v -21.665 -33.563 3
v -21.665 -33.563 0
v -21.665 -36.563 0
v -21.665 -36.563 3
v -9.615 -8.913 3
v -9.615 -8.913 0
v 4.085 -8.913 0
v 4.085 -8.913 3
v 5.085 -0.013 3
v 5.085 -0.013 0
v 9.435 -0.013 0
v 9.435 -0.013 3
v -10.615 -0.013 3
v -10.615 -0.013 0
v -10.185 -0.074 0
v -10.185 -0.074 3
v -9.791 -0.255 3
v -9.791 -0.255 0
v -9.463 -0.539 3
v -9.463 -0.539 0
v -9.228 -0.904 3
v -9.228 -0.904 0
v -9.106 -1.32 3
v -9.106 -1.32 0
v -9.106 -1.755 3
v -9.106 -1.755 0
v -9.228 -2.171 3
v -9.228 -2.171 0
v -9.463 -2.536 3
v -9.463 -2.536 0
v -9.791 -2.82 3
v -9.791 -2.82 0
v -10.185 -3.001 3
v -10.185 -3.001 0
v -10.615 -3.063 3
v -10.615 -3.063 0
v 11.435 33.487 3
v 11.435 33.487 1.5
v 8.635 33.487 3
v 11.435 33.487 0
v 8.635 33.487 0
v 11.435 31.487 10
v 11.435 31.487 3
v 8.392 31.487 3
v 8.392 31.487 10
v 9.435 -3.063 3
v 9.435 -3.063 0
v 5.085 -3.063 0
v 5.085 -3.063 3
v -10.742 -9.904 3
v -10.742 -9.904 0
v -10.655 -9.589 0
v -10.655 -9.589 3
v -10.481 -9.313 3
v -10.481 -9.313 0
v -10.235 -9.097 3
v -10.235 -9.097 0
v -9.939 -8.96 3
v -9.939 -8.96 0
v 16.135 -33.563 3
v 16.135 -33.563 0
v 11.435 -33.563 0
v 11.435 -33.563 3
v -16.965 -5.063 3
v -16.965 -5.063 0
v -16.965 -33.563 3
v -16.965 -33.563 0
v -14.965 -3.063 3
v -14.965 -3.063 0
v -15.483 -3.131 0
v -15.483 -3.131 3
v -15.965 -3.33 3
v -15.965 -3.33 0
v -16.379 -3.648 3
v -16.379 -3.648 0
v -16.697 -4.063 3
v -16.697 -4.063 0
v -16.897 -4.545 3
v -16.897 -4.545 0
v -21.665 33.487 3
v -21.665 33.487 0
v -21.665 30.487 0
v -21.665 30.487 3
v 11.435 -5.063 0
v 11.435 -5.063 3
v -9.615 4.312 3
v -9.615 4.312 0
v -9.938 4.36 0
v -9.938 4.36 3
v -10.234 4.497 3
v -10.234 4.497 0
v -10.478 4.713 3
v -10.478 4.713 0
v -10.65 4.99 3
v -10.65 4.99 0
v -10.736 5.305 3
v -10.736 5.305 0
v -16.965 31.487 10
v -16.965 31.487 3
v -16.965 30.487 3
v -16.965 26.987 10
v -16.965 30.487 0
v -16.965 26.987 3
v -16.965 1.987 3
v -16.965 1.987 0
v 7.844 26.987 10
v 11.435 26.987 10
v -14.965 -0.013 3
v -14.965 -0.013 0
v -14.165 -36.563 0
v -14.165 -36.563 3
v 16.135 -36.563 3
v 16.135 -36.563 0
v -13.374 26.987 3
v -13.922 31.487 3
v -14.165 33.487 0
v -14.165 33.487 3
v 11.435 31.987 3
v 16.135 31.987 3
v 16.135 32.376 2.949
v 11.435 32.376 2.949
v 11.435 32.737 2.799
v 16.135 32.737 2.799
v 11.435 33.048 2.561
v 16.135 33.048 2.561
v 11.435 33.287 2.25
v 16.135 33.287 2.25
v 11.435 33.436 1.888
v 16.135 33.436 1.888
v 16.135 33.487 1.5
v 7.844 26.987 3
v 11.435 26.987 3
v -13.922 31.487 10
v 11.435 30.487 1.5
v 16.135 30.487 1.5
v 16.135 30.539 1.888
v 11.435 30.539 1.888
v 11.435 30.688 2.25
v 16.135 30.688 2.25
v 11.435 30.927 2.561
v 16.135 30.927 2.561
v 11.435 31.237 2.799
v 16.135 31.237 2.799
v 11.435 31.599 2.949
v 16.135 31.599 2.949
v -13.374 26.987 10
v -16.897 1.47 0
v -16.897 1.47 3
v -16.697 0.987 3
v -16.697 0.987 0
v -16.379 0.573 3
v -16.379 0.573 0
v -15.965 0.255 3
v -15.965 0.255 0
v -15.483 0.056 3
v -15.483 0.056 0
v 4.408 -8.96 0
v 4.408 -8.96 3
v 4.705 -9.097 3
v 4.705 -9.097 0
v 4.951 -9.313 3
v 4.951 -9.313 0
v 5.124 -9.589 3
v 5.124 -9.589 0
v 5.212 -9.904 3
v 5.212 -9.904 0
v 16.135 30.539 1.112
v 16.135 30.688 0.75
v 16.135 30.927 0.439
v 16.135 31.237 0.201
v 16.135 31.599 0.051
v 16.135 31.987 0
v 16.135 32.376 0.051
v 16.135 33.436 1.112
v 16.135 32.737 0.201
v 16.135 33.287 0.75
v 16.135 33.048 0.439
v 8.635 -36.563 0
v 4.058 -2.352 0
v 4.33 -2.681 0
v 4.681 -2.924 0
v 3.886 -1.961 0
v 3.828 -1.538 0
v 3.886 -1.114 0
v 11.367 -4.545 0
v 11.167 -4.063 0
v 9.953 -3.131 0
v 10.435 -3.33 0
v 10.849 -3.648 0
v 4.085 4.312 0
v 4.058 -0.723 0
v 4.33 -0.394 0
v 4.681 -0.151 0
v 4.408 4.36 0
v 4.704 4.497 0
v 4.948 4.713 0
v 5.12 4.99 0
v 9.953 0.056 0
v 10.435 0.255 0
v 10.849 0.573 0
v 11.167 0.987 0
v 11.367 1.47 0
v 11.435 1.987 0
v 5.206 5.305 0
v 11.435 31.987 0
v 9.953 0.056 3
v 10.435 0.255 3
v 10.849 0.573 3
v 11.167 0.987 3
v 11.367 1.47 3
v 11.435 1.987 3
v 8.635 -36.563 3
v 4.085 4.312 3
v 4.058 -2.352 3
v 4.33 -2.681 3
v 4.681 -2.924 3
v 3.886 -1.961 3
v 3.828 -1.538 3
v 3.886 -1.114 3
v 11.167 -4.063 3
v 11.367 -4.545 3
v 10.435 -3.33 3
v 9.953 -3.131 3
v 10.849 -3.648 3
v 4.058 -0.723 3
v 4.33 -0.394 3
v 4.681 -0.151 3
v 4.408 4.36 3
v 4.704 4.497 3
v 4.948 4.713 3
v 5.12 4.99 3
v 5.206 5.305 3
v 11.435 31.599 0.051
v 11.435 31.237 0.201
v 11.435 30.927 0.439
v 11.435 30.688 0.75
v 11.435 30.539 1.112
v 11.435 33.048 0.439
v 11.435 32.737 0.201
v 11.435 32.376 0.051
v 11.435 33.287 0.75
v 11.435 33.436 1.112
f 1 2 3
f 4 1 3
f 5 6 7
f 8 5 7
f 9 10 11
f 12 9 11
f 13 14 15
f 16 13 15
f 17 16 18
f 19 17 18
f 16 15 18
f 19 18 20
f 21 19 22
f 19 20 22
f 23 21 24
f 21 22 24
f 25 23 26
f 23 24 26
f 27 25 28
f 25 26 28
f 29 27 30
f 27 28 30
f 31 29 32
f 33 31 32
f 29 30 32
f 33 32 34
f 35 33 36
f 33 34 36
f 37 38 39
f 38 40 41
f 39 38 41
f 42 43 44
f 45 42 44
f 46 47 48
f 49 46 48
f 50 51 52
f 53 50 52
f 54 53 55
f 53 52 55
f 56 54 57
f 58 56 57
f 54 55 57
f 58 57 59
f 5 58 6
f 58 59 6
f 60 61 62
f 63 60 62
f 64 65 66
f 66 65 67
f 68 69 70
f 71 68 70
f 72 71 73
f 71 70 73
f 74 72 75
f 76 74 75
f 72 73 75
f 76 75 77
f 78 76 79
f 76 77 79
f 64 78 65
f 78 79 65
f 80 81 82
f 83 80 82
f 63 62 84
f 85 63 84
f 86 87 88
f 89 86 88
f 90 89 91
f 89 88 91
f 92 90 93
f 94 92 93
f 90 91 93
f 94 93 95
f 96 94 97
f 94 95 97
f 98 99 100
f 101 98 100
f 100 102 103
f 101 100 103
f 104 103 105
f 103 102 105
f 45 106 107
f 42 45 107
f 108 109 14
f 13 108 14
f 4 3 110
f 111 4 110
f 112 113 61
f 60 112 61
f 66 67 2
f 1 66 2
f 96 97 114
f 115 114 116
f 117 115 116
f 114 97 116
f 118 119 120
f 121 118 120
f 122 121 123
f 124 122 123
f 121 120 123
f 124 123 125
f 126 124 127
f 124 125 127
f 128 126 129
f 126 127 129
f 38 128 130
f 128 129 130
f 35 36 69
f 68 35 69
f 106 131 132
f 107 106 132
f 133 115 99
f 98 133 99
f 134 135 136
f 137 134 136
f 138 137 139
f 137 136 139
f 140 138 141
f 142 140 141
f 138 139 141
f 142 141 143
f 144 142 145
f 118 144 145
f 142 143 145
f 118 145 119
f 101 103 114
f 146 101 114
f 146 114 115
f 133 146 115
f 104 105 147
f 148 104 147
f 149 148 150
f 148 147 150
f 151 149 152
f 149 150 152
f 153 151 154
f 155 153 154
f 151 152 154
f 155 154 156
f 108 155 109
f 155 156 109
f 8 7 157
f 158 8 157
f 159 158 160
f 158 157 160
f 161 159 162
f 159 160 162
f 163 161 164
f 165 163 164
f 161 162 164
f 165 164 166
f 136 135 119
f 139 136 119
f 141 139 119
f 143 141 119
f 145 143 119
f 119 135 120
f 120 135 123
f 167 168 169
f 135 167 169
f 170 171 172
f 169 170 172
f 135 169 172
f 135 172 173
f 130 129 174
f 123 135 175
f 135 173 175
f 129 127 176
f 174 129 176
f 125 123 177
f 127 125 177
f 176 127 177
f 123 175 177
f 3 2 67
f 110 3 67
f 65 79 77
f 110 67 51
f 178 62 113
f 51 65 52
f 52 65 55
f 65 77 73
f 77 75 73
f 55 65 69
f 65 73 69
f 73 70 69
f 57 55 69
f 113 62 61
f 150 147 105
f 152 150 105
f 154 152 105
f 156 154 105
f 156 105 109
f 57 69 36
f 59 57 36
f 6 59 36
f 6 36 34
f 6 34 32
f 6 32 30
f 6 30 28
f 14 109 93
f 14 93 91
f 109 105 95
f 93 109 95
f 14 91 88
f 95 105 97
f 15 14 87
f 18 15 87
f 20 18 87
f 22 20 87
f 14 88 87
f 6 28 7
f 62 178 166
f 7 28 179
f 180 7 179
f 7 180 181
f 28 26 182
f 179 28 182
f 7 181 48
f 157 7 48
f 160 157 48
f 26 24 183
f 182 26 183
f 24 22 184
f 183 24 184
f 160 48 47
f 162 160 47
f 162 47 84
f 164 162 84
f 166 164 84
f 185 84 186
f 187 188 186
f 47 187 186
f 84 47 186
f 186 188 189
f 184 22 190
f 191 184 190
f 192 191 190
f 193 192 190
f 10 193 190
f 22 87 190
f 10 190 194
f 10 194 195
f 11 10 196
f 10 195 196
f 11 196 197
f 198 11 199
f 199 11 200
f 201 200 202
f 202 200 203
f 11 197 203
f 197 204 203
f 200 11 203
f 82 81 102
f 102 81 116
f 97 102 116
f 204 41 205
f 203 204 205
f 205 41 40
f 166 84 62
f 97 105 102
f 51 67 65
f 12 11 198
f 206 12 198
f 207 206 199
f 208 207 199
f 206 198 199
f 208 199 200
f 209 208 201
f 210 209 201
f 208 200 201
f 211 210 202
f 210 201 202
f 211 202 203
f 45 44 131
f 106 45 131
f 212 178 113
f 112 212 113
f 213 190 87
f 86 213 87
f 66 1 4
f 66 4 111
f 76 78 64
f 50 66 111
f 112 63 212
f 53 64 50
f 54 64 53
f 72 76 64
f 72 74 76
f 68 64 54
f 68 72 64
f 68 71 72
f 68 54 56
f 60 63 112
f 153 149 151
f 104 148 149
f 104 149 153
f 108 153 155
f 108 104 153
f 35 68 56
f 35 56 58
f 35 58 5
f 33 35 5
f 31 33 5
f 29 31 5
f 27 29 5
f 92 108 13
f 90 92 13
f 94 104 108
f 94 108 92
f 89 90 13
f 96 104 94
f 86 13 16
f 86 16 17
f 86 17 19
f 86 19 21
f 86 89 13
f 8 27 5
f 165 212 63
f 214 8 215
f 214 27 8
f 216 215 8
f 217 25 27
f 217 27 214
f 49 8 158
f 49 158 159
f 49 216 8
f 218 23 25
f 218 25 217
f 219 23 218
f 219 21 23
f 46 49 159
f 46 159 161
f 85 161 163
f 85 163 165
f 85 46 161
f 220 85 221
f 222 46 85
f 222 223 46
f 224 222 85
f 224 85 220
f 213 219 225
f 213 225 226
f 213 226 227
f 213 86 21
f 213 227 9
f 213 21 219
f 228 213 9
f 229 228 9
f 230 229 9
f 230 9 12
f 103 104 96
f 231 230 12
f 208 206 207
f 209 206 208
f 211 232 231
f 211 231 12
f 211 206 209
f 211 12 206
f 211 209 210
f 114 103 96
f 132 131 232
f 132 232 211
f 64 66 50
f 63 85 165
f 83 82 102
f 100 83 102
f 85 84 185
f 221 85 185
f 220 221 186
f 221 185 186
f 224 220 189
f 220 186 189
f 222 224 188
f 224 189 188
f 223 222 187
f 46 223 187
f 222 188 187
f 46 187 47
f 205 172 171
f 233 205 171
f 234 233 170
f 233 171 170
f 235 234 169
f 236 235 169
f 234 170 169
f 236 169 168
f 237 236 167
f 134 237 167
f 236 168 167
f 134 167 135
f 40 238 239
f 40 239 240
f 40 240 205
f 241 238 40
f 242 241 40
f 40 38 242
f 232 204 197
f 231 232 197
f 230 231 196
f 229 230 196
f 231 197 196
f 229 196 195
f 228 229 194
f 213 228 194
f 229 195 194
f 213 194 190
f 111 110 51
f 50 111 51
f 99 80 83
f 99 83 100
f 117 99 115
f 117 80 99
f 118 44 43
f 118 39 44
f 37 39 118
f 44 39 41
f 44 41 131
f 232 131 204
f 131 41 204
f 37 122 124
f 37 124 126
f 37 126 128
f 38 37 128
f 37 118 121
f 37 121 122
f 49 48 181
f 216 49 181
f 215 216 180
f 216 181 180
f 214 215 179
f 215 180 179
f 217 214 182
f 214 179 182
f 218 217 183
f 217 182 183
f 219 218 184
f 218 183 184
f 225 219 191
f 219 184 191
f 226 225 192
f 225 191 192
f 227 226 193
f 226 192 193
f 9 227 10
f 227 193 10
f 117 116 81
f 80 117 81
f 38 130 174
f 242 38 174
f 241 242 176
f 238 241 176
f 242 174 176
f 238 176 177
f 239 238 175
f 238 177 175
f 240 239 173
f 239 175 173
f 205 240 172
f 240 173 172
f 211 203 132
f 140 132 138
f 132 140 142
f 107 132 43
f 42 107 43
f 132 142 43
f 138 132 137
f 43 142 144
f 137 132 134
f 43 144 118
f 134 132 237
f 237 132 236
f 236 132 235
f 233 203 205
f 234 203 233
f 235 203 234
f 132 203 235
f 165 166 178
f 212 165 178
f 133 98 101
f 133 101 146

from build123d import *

# Parameters (mm, degrees)
F1_DEPTH = 3
F3_DEPTH = 7
F5_DEPTH = 4.7


with BuildPart() as f1:
    # F0 (on Top) → F1 (new body)
    with BuildSketch(Plane.XY):
        with BuildLine():
            Line((16.134871, -36.562502), (16.134871, -33.562502))
            Line((16.134871, -33.562502), (11.434871, -33.562502))
            Line((11.434871, -33.562502), (11.434871, -5.062502))
            ThreePointArc((11.434871, -5.062502), (10.849085, -3.648289), (9.434871, -3.062502))
            Line((9.434871, -3.062502), (5.084871, -3.062502))
            ThreePointArc((5.084871, -3.062502), (3.827619, -1.537502), (5.084871, -0.012502))
            Line((5.084871, -0.012502), (9.434871, -0.012502))
            ThreePointArc((9.434871, -0.012502), (10.849085, 0.573284), (11.434871, 1.987498))
            Line((11.434871, 1.987498), (11.434871, 30.487498))
            Line((11.434871, 30.487498), (16.134871, 30.487498))
            Line((16.134871, 30.487498), (16.134871, 33.487498))
            Line((16.134871, 33.487498), (8.634871, 33.487498))
            Line((8.634871, 33.487498), (5.20566, 5.305176))
            ThreePointArc((5.20566, 5.305176), (4.833466, 4.596348), (4.084871, 4.312498))
            Line((4.084871, 4.312498), (-9.615129, 4.312498))
            ThreePointArc((-9.615129, 4.312498), (-10.363724, 4.596348), (-10.735917, 5.305176))
            Line((-10.735917, 5.305176), (-14.165129, 33.487498))
            Line((-14.165129, 33.487498), (-21.665129, 33.487498))
            Line((-21.665129, 33.487498), (-21.665129, 30.487498))
            Line((-21.665129, 30.487498), (-16.965129, 30.487498))
            Line((-16.965129, 30.487498), (-16.965129, 1.987498))
            ThreePointArc((-16.965129, 1.987498), (-16.379342, 0.573284), (-14.965129, -0.012502))
            Line((-14.965129, -0.012502), (-10.615129, -0.012502))
            ThreePointArc((-10.615129, -0.012502), (-9.090129, -1.537502), (-10.615129, -3.062502))
            Line((-10.615129, -3.062502), (-14.965129, -3.062502))
            ThreePointArc((-14.965129, -3.062502), (-16.379342, -3.648289), (-16.965129, -5.062502))
            Line((-16.965129, -5.062502), (-16.965129, -33.562502))
            Line((-16.965129, -33.562502), (-21.665129, -33.562502))
            Line((-21.665129, -33.562502), (-21.665129, -36.562502))
            Line((-21.665129, -36.562502), (-14.165129, -36.562502))
            Line((-14.165129, -36.562502), (-10.742474, -9.904361))
            ThreePointArc((-10.742474, -9.904361), (-10.36591, -9.195764), (-9.615129, -8.912502))
            Line((-9.615129, -8.912502), (4.084871, -8.912502))
            ThreePointArc((4.084871, -8.912502), (4.835653, -9.195764), (5.212216, -9.904361))
            Line((5.212216, -9.904361), (8.634871, -36.562502))
            Line((8.634871, -36.562502), (16.134871, -36.562502))
        make_face()
    extrude(amount=F1_DEPTH)

    # F2 (on face) → F3 (join)
    with BuildSketch(Plane.XY.offset(3)):
        Polygon((-13.92177, 31.487498), (-16.965129, 31.487498), (-16.965129, 26.987498), (-13.374212, 26.987498), align=None)
        Polygon((11.434871, 26.987498), (11.434871, 31.487498), (8.391512, 31.487498), (7.843954, 26.987498), align=None)
    extrude(amount=F3_DEPTH)

    # F4 (on face) → F5 (cut)
    with BuildSketch(Plane.YZ.offset(16.134871)):
        with BuildLine():
            ThreePointArc((30.487498, 1.5), (30.926837, 2.56066), (31.987498, 3))
            Line((31.987498, 3), (30.487498, 3))
            Line((30.487498, 3), (30.487498, 1.5))
        make_face()
        with BuildLine():
            Line((30.487498, 0), (31.987498, 0))
            ThreePointArc((31.987498, 0), (30.926837, 0.43934), (30.487498, 1.5))
            Line((30.487498, 1.5), (30.487498, 0))
        make_face()
        with BuildLine():
            Line((33.487498, 0), (33.487498, 1.5))
            ThreePointArc((33.487498, 1.5), (33.048158, 0.43934), (31.987498, 0))
            Line((31.987498, 0), (33.487498, 0))
        make_face()
        with BuildLine():
            ThreePointArc((31.987498, 3), (33.048158, 2.56066), (33.487498, 1.5))
            Line((33.487498, 1.5), (33.487498, 3))
            Line((33.487498, 3), (31.987498, 3))
        make_face()
    extrude(amount=-F5_DEPTH, mode=Mode.SUBTRACT)


solid = f1.part
